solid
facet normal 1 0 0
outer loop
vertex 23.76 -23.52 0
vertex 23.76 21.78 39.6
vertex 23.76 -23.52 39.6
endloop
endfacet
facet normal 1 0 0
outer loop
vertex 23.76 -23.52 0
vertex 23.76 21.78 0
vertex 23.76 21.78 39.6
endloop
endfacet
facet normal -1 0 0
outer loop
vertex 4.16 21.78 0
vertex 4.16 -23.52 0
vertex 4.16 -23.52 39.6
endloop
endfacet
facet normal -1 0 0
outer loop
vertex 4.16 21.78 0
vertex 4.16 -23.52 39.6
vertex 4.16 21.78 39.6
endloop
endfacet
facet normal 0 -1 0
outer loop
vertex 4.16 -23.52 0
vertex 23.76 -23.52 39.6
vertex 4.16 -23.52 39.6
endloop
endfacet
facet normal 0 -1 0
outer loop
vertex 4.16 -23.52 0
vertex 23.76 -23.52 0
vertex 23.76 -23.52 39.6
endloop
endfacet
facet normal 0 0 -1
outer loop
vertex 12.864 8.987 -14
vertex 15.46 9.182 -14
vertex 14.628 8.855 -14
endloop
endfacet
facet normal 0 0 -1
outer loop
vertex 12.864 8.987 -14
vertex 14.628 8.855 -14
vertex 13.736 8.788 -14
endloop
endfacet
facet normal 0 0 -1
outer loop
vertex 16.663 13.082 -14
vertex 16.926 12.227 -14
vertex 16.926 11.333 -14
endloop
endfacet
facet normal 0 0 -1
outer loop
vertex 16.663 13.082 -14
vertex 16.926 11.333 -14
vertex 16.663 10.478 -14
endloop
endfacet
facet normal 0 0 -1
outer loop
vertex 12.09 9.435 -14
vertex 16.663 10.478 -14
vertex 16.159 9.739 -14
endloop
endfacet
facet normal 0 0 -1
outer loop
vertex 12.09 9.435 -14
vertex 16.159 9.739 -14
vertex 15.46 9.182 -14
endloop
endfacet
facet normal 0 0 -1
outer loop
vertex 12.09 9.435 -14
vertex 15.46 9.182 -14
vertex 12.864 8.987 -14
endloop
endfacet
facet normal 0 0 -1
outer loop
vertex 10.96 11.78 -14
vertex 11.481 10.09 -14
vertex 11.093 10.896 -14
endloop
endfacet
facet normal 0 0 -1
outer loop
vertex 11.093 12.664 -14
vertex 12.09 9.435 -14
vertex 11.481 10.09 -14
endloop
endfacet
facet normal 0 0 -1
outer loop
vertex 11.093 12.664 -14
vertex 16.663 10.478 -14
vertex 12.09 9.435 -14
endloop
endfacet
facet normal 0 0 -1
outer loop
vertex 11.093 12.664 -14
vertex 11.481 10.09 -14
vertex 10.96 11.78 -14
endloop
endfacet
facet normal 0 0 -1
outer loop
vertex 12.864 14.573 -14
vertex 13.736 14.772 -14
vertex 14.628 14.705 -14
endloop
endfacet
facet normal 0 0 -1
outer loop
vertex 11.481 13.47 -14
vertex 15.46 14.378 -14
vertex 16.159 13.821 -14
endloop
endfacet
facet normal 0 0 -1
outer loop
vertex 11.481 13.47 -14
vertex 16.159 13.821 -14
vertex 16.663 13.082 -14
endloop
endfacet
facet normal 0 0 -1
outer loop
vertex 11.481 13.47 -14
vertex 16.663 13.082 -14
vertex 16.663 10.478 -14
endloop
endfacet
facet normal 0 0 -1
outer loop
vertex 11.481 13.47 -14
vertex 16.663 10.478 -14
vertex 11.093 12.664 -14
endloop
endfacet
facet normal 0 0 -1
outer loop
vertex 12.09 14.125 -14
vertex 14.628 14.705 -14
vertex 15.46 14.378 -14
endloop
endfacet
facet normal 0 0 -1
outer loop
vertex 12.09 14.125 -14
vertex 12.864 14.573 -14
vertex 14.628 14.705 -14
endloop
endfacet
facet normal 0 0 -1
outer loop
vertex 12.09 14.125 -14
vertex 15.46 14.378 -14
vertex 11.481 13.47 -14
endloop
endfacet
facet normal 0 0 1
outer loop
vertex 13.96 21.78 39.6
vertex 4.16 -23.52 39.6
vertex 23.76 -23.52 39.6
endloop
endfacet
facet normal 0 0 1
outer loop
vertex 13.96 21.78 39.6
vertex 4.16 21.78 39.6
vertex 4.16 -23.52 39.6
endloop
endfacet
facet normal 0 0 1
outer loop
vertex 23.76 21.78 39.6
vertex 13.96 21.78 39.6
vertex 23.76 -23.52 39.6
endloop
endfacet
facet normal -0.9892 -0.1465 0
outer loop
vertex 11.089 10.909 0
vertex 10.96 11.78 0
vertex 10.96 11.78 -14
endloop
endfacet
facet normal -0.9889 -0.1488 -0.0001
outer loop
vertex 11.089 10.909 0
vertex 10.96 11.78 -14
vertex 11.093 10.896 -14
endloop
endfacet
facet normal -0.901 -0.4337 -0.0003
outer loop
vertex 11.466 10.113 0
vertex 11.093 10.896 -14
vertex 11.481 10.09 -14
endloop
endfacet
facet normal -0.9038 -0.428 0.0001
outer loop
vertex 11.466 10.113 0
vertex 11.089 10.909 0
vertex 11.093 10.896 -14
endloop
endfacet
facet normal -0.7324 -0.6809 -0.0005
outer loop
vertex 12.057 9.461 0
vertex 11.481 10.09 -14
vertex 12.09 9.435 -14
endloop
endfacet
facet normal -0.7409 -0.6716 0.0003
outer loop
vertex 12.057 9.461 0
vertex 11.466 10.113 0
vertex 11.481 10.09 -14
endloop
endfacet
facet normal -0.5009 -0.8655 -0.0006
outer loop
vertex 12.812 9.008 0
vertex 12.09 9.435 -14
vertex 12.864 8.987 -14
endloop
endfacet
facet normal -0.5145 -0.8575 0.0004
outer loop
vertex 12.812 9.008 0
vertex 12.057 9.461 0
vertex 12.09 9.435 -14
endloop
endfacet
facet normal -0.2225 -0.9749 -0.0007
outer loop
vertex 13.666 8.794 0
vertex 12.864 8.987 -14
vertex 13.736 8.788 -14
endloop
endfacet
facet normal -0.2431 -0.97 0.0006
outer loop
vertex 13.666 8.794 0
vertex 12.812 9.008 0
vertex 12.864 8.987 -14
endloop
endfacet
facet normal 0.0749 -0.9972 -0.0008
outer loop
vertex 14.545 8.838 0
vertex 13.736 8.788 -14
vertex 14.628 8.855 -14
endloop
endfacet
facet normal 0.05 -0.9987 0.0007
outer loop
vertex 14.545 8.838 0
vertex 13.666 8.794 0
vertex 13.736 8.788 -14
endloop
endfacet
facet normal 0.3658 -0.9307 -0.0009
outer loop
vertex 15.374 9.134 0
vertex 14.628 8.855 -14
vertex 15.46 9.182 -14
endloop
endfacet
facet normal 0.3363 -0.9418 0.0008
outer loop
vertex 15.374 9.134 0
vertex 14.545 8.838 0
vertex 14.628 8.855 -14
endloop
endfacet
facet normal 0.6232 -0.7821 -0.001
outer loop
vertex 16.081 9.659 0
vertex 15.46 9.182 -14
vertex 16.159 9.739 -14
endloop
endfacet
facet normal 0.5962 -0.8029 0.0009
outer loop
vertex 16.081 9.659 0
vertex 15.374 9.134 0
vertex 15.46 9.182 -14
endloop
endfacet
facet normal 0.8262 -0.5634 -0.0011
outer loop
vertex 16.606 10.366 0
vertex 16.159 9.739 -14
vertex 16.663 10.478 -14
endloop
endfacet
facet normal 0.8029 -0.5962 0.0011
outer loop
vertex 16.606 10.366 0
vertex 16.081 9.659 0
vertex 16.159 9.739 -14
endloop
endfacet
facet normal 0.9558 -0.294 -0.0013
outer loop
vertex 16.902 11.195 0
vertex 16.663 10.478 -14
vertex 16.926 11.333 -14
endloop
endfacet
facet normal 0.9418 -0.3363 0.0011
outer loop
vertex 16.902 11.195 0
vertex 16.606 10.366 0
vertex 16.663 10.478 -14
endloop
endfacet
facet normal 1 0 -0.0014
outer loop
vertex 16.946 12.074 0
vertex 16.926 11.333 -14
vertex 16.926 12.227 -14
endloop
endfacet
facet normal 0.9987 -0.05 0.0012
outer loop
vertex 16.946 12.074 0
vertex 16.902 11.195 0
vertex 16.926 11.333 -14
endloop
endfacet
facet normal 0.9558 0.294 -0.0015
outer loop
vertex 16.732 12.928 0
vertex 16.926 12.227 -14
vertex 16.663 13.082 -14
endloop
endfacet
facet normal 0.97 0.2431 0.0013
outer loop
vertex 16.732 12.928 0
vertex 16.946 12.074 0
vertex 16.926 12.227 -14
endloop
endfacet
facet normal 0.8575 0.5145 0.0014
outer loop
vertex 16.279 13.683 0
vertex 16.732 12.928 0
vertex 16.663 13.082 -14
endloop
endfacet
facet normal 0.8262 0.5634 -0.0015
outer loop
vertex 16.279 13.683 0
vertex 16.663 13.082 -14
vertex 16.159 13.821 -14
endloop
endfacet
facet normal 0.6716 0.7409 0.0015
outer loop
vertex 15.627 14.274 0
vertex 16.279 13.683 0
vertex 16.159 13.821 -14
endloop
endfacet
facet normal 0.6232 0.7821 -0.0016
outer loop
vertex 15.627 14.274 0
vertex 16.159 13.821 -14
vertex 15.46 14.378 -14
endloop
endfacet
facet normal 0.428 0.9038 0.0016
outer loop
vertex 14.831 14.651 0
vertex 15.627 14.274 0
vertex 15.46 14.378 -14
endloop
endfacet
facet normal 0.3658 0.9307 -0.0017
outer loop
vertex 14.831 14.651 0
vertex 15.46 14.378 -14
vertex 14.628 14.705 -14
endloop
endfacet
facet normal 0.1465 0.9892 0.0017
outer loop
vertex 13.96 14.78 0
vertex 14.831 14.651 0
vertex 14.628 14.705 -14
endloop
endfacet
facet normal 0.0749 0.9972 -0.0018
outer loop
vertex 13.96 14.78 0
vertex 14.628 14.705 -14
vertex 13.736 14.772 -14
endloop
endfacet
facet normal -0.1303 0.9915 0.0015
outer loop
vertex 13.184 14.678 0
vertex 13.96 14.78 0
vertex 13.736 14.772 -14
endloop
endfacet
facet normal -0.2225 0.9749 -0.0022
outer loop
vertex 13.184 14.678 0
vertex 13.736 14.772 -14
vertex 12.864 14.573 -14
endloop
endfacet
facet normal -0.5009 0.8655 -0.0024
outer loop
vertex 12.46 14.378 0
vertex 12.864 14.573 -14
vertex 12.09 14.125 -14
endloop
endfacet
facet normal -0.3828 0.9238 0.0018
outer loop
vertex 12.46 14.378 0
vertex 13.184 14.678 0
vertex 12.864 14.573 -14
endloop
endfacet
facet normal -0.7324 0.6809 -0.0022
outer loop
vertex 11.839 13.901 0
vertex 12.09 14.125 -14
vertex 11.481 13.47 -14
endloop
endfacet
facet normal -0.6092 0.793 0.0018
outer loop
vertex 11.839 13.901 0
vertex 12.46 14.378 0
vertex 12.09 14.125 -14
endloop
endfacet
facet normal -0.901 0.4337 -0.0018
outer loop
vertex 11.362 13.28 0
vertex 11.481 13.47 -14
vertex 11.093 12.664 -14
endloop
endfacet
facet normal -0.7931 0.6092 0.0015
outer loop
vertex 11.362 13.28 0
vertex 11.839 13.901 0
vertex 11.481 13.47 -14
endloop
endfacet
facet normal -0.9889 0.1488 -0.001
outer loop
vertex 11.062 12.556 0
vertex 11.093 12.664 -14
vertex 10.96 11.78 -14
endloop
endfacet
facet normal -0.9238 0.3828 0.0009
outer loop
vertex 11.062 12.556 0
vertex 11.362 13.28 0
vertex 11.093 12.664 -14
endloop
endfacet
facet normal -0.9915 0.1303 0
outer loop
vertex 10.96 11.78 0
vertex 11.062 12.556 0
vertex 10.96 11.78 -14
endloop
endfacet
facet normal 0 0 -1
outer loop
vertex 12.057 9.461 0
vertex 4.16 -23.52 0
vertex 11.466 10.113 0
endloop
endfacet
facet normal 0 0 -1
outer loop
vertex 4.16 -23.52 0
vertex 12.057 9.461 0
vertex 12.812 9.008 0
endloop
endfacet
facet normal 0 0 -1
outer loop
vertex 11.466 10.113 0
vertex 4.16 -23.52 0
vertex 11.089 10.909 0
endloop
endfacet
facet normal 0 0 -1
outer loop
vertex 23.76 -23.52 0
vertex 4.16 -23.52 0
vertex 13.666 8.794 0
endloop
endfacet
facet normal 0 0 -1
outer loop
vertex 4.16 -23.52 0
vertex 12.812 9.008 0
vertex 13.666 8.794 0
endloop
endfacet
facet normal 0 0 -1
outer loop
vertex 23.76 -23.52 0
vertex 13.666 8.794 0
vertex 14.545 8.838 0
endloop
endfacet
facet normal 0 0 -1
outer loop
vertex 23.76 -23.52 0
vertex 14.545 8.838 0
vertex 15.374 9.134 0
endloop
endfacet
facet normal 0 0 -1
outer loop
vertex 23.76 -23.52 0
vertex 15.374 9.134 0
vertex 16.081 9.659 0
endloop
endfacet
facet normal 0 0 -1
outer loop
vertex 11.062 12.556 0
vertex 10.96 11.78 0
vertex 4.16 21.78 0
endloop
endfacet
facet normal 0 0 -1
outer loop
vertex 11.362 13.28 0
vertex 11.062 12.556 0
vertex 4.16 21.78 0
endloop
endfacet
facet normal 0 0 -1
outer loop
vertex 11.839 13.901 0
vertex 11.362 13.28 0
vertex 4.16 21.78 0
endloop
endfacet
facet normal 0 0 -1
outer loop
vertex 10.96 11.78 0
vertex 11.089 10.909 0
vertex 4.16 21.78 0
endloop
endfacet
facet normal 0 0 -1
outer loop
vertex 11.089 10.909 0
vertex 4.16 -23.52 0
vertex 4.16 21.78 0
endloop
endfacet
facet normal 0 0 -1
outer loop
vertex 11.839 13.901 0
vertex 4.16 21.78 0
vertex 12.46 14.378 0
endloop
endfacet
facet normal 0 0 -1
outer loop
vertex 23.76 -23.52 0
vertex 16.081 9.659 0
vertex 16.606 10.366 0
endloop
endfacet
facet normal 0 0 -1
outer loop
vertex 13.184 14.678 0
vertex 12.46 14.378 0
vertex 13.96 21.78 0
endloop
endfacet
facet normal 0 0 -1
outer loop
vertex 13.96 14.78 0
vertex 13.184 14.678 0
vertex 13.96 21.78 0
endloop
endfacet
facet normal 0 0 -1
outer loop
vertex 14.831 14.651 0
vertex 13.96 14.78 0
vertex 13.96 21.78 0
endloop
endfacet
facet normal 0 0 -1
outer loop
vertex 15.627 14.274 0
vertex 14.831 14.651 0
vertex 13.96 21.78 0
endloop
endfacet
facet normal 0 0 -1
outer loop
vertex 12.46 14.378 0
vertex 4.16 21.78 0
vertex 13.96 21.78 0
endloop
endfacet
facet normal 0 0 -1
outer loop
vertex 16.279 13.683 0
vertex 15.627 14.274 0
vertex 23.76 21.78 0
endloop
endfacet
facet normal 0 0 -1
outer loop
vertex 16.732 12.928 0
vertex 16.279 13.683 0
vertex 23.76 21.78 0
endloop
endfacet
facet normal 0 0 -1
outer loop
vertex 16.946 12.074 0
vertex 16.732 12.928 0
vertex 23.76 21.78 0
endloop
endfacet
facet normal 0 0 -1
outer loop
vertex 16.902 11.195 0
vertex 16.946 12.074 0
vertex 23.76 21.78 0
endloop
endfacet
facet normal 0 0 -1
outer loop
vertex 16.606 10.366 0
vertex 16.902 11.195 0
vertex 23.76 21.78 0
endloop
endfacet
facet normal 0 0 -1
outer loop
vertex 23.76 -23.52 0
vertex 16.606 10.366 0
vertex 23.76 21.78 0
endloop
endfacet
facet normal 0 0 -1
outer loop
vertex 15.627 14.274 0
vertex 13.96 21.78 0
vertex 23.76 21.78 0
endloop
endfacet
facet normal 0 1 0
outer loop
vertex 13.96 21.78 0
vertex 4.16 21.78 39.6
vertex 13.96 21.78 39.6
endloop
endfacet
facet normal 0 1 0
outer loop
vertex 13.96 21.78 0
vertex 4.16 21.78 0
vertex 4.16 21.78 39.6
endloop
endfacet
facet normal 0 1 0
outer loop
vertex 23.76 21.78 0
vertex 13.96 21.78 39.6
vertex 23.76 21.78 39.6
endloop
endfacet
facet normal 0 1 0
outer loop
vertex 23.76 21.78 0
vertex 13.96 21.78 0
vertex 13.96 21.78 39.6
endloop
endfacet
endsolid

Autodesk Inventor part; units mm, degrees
ref_plane "YZ Plane" through (0, 0, 0) normal (1, 0, 0) x (0, 1, 0)
ref_plane "XZ Plane" through (0, 0, 0) normal (0, 1, 0) x (-1, 0, 0)
ref_plane "XY Plane" through (0, 0, 0) normal (0, 0, 1) x (1, 0, 0)
sketch "Sketch1" plane through (0, 0, 0) normal (0, 0, 1) x (1, 0, 0)
  line L0 (4.16, 21.78) -> (23.76, 21.78)
  line L1 (23.76, 21.78) -> (23.76, -23.52)
  line L2 (23.76, -23.52) -> (4.16, -23.52)
  line L3 (4.16, -23.52) -> (4.16, 21.78)
  line L4 (4.16, 21.78) -> (23.76, 21.78)
  line L5 (13.96, 21.78) -> (13.96, 11.78)
  circle A0 centre (13.96, 11.78) radius 3
  point P0 (0, 0)
  dimension "d0" = 45.3
  dimension "d1" = 19.6
  dimension "d2" = 10
  dimension "d3" = 6
extrude "Extrusion1" add sketch "Sketch1" along normal blind 39.6 contours A0 | L0 L1 L2 L3
sketch "Sketch2" plane through (0, 0, 0) normal (0, 0, -1) x (-1, 0, 0)
  line L0 (-23.76, 21.78) -> (-4.16, 21.78) projected
  line L1 (-23.76, 21.78) -> (-4.16, 21.78)
  line L2 (-13.96, 21.78) -> (-13.96, 11.78)
  circle A0 centre (-13.96, 11.78) radius 3
  point P0 (0, 0)
  dimension "d6" = 10
  dimension "d7" = 6
extrude "Extrusion2" add sketch "Sketch2" along normal blind 10
sketch "Sketch3" plane through (13.96, 11.78, -10) normal (0, 0, -1) x (-1, 0, 0)
  circle A0 centre (0, 0) radius 3 projected
  circle A1 centre (0, 0) radius 3
  point P0 (13.96, -11.78)
extrude "Extrusion3" add sketch "Sketch3" along normal blind 4
properties part number "motor_basic"
